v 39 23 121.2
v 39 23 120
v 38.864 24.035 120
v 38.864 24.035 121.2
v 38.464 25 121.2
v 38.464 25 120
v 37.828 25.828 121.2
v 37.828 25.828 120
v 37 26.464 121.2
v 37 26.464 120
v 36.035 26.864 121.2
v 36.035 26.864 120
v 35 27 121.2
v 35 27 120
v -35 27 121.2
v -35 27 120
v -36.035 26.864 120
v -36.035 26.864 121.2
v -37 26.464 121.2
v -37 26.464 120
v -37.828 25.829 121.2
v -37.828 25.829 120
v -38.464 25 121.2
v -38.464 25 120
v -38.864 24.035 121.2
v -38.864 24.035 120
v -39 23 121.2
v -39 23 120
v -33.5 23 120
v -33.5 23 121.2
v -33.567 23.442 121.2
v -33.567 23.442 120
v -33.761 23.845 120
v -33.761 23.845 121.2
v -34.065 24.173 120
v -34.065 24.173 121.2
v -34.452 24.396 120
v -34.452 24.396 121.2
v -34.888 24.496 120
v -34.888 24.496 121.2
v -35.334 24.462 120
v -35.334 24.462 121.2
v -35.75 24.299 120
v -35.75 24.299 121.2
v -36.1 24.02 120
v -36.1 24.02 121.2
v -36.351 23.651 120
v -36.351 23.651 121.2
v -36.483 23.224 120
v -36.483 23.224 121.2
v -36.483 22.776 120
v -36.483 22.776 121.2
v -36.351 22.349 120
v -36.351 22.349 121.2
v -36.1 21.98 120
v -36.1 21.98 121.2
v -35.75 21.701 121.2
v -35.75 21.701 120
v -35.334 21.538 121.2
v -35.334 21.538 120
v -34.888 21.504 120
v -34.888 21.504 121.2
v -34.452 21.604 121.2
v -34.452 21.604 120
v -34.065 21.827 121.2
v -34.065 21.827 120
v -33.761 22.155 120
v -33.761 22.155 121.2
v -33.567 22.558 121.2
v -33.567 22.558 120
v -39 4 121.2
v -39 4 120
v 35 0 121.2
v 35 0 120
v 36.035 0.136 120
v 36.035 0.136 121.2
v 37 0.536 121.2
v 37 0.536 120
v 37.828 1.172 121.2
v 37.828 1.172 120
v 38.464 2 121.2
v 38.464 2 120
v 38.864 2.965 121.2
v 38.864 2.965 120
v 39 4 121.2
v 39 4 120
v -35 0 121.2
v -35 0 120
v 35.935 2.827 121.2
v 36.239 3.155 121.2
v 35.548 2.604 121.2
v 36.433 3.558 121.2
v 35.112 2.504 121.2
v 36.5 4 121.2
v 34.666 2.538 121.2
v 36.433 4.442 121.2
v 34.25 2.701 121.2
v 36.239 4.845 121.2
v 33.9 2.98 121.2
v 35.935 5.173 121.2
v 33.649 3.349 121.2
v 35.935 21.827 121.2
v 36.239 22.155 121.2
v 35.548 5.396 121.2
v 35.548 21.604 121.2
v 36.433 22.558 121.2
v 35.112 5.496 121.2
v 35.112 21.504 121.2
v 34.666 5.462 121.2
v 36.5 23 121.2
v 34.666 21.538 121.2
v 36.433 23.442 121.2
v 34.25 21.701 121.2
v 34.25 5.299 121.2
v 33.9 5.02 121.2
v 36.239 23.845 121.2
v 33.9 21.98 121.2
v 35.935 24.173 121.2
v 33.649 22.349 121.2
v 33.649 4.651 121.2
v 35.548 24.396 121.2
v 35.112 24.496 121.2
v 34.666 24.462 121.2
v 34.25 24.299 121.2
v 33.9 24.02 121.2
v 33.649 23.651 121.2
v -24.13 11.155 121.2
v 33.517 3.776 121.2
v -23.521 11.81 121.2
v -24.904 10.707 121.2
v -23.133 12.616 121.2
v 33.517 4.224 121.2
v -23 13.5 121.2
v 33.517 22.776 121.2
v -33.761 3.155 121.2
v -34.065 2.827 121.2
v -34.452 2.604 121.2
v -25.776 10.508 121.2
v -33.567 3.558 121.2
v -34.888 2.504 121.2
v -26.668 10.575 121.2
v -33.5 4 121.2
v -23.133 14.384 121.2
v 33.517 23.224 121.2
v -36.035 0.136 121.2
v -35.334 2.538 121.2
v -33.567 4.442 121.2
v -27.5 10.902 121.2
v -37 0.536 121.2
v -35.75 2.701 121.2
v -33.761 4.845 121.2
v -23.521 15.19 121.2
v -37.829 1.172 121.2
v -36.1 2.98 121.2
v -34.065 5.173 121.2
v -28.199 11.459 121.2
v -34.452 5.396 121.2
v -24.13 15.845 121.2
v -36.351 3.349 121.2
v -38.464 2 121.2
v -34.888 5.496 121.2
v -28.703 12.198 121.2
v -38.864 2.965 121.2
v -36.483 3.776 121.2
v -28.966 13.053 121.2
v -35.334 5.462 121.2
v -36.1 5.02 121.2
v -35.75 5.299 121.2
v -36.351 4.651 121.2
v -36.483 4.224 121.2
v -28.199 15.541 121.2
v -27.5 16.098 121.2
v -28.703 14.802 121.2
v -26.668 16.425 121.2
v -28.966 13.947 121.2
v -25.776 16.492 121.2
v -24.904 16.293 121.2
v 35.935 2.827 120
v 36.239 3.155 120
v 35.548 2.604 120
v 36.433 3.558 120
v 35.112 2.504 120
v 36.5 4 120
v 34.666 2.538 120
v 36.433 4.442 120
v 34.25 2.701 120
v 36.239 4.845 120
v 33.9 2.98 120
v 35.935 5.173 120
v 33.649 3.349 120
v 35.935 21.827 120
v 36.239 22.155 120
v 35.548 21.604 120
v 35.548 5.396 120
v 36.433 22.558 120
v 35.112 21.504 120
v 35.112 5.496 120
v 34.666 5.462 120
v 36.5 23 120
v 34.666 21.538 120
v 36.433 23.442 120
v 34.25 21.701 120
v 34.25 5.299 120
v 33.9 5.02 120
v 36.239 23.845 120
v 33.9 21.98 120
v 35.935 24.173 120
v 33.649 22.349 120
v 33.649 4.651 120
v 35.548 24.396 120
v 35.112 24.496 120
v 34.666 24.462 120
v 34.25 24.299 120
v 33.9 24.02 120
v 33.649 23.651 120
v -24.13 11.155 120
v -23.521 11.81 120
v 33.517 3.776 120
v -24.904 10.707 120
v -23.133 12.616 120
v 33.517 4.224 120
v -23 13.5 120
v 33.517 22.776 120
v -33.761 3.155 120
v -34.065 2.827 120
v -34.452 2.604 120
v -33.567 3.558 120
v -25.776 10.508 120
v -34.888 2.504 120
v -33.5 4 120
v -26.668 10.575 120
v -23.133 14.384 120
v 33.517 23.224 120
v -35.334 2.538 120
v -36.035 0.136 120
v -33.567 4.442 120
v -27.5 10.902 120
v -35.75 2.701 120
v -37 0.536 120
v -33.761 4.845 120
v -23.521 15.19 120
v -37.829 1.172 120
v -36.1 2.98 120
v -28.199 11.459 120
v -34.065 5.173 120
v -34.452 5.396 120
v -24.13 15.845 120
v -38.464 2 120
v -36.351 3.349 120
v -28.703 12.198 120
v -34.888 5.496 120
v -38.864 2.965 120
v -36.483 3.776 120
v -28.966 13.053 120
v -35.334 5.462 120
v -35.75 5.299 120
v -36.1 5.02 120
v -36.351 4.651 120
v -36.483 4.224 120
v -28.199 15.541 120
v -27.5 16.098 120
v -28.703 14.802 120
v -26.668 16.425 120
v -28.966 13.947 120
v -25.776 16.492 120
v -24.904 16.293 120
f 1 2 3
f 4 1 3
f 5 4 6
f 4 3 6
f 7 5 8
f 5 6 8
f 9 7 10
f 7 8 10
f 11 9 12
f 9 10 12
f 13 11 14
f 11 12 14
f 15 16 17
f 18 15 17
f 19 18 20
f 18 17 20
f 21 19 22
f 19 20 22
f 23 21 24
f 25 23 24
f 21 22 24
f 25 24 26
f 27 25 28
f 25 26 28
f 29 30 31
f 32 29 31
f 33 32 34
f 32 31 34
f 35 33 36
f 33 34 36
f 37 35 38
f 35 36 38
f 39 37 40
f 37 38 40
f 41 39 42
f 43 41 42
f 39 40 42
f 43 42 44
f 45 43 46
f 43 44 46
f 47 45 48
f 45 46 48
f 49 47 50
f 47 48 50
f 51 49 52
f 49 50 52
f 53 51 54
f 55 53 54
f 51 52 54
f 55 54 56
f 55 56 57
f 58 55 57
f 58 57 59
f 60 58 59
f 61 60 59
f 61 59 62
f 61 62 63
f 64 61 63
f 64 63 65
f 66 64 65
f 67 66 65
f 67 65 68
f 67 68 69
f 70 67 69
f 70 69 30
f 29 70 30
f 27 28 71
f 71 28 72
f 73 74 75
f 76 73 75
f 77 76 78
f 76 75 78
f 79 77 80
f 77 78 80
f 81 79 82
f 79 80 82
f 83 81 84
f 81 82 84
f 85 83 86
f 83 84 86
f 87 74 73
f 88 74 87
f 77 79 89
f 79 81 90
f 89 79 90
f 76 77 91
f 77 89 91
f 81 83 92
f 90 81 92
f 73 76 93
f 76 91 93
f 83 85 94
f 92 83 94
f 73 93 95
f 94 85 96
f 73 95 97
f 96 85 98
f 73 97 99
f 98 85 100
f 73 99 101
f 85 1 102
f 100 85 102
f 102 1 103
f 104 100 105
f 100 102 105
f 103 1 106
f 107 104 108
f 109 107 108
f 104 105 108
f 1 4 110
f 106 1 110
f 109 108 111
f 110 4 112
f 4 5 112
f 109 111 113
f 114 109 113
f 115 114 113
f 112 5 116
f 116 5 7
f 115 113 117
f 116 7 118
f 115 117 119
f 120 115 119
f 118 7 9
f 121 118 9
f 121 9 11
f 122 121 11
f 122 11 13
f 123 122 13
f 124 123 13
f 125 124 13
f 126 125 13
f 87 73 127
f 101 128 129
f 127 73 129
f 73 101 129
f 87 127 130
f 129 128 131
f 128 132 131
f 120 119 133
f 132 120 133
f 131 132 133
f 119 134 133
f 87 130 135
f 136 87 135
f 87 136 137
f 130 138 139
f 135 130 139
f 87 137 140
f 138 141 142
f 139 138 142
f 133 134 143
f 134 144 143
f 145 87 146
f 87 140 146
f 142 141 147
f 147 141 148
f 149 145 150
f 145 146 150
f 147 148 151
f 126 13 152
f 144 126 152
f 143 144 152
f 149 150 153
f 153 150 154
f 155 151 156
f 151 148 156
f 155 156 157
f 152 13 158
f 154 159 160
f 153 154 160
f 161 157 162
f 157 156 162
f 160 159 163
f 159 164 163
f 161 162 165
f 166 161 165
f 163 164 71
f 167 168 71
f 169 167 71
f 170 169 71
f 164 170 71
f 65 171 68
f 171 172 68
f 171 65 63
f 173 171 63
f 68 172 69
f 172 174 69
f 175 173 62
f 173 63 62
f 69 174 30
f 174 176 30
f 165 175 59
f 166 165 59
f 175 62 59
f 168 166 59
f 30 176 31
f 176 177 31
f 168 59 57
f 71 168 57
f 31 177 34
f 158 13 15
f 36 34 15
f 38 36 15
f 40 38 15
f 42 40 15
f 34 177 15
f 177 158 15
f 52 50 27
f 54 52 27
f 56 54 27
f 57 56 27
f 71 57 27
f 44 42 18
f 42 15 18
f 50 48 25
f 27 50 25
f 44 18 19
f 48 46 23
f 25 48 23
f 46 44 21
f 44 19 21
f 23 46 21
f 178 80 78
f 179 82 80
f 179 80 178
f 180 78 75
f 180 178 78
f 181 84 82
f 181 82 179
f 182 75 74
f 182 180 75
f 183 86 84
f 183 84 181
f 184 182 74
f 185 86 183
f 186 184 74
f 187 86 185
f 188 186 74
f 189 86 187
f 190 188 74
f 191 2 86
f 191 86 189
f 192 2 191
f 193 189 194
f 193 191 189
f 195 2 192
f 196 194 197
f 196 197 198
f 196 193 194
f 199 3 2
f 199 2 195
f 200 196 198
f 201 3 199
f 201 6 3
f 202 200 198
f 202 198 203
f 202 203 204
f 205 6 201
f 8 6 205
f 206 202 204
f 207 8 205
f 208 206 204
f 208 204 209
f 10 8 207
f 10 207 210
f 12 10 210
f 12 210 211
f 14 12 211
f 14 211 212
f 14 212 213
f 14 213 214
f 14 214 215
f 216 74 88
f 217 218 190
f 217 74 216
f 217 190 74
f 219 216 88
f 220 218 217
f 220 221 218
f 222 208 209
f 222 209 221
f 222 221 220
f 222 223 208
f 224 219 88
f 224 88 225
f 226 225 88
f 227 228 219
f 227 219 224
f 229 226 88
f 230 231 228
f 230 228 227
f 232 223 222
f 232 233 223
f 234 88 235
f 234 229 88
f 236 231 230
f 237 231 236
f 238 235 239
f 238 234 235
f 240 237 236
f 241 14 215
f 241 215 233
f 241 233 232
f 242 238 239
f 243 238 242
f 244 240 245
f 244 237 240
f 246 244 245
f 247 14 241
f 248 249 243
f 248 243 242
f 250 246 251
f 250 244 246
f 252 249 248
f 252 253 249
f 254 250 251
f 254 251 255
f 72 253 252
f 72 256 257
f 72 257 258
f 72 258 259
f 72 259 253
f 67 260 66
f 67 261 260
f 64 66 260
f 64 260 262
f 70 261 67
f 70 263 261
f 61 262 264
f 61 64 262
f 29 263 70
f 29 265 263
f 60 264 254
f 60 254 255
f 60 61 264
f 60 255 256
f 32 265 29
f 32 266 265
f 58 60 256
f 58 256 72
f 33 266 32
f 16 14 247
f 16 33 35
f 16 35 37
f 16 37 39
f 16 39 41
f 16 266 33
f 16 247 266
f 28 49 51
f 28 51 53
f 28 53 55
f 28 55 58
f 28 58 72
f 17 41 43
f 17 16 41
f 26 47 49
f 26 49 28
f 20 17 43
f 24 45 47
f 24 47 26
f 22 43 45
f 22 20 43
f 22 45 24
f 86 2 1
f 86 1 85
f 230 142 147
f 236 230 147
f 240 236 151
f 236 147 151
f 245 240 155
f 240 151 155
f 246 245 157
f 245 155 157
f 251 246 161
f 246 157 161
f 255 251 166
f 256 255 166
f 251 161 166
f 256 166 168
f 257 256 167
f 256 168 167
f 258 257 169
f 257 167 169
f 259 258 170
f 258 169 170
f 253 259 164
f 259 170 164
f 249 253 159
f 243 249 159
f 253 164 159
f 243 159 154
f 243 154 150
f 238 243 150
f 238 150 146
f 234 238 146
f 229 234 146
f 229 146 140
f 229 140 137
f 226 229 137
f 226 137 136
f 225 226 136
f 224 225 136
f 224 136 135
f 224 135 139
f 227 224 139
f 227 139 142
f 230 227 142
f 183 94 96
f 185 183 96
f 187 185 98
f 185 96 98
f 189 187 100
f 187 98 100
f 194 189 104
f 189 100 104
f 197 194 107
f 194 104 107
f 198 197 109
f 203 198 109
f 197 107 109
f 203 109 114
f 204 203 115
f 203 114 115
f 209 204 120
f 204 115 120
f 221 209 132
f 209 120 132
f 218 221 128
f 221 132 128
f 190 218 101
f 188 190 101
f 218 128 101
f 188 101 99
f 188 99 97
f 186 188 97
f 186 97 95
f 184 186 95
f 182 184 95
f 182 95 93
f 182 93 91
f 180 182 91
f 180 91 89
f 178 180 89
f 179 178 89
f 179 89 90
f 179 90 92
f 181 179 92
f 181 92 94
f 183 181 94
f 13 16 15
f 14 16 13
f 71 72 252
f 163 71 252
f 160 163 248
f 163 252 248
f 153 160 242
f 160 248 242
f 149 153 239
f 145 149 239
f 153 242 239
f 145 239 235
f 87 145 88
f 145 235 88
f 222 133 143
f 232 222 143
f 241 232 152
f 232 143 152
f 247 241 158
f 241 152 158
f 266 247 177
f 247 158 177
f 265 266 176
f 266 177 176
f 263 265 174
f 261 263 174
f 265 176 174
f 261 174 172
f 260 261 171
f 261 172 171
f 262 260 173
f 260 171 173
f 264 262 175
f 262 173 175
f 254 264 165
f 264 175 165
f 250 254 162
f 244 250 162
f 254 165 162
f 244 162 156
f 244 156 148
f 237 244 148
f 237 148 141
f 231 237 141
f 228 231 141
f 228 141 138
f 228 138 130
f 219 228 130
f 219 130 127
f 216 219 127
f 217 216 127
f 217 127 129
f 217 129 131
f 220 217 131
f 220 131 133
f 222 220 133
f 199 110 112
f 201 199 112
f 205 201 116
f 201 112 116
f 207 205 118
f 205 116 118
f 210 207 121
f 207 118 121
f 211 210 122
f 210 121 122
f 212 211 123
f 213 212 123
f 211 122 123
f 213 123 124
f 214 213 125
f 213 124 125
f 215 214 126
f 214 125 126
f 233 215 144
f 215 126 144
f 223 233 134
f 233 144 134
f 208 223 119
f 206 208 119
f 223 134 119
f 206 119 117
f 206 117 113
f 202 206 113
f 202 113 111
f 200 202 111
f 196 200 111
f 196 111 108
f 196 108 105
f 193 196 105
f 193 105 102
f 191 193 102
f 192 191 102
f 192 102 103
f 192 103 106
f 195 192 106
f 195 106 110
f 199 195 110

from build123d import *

# Parameters (mm, degrees)
PAD041_DEPTH    = 1.2
SKETCH044_R     = 1.5
POCKET001_DEPTH = 5
SKETCH046_R     = 3
POCKET003_DEPTH = 5


with BuildPart() as part:
    # Sketch042 → Pad041 (new body)
    with BuildSketch(Plane.XY):
        with BuildLine():
            Line((-34.999999, 27), (35.000001, 27))
            ThreePointArc((38.999841, 23.000159), (37.828268, 25.828427), (35.000001, 27))
            Line((38.999841, 23.000159), (38.999841, 4.000159))
            ThreePointArc((35, 0), (37.828381, 1.171685), (38.999841, 4.000159))
            Line((35, 0), (-35, 0))
            ThreePointArc((-39.000159, 4.000159), (-37.828586, 1.171573), (-35, 0))
            Line((-39.000159, 23.00016), (-39.000159, 4.000159))
            ThreePointArc((-34.999999, 27), (-37.828473, 25.82854), (-39.000159, 23.00016))
        make_face()
    extrude(amount=PAD041_DEPTH)

    # Sketch044 (on Face10 of Pad041) → Pocket001 (cut)
    with BuildSketch(Plane.XY.offset(1.2)):
        with Locations((-35, 23)):
            Circle(SKETCH044_R)
        with Locations((35, 23)):
            Circle(SKETCH044_R)
        with Locations((35, 4)):
            Circle(SKETCH044_R)
        with Locations((-35, 4)):
            Circle(SKETCH044_R)
    extrude(amount=-POCKET001_DEPTH, mode=Mode.SUBTRACT)

    # Sketch046 (on Face5 of Pocket001) → Pocket003 (cut)
    with BuildSketch(Plane.XY.offset(1.2)):
        with Locations((-26, 13.5)):
            Circle(SKETCH046_R)
    extrude(amount=-POCKET003_DEPTH, mode=Mode.SUBTRACT)


with BuildPart() as part_1:
    # Body015 placement: moved
    add(part.part.moved(Location((0, 0, 120))))


solid = part_1.part
